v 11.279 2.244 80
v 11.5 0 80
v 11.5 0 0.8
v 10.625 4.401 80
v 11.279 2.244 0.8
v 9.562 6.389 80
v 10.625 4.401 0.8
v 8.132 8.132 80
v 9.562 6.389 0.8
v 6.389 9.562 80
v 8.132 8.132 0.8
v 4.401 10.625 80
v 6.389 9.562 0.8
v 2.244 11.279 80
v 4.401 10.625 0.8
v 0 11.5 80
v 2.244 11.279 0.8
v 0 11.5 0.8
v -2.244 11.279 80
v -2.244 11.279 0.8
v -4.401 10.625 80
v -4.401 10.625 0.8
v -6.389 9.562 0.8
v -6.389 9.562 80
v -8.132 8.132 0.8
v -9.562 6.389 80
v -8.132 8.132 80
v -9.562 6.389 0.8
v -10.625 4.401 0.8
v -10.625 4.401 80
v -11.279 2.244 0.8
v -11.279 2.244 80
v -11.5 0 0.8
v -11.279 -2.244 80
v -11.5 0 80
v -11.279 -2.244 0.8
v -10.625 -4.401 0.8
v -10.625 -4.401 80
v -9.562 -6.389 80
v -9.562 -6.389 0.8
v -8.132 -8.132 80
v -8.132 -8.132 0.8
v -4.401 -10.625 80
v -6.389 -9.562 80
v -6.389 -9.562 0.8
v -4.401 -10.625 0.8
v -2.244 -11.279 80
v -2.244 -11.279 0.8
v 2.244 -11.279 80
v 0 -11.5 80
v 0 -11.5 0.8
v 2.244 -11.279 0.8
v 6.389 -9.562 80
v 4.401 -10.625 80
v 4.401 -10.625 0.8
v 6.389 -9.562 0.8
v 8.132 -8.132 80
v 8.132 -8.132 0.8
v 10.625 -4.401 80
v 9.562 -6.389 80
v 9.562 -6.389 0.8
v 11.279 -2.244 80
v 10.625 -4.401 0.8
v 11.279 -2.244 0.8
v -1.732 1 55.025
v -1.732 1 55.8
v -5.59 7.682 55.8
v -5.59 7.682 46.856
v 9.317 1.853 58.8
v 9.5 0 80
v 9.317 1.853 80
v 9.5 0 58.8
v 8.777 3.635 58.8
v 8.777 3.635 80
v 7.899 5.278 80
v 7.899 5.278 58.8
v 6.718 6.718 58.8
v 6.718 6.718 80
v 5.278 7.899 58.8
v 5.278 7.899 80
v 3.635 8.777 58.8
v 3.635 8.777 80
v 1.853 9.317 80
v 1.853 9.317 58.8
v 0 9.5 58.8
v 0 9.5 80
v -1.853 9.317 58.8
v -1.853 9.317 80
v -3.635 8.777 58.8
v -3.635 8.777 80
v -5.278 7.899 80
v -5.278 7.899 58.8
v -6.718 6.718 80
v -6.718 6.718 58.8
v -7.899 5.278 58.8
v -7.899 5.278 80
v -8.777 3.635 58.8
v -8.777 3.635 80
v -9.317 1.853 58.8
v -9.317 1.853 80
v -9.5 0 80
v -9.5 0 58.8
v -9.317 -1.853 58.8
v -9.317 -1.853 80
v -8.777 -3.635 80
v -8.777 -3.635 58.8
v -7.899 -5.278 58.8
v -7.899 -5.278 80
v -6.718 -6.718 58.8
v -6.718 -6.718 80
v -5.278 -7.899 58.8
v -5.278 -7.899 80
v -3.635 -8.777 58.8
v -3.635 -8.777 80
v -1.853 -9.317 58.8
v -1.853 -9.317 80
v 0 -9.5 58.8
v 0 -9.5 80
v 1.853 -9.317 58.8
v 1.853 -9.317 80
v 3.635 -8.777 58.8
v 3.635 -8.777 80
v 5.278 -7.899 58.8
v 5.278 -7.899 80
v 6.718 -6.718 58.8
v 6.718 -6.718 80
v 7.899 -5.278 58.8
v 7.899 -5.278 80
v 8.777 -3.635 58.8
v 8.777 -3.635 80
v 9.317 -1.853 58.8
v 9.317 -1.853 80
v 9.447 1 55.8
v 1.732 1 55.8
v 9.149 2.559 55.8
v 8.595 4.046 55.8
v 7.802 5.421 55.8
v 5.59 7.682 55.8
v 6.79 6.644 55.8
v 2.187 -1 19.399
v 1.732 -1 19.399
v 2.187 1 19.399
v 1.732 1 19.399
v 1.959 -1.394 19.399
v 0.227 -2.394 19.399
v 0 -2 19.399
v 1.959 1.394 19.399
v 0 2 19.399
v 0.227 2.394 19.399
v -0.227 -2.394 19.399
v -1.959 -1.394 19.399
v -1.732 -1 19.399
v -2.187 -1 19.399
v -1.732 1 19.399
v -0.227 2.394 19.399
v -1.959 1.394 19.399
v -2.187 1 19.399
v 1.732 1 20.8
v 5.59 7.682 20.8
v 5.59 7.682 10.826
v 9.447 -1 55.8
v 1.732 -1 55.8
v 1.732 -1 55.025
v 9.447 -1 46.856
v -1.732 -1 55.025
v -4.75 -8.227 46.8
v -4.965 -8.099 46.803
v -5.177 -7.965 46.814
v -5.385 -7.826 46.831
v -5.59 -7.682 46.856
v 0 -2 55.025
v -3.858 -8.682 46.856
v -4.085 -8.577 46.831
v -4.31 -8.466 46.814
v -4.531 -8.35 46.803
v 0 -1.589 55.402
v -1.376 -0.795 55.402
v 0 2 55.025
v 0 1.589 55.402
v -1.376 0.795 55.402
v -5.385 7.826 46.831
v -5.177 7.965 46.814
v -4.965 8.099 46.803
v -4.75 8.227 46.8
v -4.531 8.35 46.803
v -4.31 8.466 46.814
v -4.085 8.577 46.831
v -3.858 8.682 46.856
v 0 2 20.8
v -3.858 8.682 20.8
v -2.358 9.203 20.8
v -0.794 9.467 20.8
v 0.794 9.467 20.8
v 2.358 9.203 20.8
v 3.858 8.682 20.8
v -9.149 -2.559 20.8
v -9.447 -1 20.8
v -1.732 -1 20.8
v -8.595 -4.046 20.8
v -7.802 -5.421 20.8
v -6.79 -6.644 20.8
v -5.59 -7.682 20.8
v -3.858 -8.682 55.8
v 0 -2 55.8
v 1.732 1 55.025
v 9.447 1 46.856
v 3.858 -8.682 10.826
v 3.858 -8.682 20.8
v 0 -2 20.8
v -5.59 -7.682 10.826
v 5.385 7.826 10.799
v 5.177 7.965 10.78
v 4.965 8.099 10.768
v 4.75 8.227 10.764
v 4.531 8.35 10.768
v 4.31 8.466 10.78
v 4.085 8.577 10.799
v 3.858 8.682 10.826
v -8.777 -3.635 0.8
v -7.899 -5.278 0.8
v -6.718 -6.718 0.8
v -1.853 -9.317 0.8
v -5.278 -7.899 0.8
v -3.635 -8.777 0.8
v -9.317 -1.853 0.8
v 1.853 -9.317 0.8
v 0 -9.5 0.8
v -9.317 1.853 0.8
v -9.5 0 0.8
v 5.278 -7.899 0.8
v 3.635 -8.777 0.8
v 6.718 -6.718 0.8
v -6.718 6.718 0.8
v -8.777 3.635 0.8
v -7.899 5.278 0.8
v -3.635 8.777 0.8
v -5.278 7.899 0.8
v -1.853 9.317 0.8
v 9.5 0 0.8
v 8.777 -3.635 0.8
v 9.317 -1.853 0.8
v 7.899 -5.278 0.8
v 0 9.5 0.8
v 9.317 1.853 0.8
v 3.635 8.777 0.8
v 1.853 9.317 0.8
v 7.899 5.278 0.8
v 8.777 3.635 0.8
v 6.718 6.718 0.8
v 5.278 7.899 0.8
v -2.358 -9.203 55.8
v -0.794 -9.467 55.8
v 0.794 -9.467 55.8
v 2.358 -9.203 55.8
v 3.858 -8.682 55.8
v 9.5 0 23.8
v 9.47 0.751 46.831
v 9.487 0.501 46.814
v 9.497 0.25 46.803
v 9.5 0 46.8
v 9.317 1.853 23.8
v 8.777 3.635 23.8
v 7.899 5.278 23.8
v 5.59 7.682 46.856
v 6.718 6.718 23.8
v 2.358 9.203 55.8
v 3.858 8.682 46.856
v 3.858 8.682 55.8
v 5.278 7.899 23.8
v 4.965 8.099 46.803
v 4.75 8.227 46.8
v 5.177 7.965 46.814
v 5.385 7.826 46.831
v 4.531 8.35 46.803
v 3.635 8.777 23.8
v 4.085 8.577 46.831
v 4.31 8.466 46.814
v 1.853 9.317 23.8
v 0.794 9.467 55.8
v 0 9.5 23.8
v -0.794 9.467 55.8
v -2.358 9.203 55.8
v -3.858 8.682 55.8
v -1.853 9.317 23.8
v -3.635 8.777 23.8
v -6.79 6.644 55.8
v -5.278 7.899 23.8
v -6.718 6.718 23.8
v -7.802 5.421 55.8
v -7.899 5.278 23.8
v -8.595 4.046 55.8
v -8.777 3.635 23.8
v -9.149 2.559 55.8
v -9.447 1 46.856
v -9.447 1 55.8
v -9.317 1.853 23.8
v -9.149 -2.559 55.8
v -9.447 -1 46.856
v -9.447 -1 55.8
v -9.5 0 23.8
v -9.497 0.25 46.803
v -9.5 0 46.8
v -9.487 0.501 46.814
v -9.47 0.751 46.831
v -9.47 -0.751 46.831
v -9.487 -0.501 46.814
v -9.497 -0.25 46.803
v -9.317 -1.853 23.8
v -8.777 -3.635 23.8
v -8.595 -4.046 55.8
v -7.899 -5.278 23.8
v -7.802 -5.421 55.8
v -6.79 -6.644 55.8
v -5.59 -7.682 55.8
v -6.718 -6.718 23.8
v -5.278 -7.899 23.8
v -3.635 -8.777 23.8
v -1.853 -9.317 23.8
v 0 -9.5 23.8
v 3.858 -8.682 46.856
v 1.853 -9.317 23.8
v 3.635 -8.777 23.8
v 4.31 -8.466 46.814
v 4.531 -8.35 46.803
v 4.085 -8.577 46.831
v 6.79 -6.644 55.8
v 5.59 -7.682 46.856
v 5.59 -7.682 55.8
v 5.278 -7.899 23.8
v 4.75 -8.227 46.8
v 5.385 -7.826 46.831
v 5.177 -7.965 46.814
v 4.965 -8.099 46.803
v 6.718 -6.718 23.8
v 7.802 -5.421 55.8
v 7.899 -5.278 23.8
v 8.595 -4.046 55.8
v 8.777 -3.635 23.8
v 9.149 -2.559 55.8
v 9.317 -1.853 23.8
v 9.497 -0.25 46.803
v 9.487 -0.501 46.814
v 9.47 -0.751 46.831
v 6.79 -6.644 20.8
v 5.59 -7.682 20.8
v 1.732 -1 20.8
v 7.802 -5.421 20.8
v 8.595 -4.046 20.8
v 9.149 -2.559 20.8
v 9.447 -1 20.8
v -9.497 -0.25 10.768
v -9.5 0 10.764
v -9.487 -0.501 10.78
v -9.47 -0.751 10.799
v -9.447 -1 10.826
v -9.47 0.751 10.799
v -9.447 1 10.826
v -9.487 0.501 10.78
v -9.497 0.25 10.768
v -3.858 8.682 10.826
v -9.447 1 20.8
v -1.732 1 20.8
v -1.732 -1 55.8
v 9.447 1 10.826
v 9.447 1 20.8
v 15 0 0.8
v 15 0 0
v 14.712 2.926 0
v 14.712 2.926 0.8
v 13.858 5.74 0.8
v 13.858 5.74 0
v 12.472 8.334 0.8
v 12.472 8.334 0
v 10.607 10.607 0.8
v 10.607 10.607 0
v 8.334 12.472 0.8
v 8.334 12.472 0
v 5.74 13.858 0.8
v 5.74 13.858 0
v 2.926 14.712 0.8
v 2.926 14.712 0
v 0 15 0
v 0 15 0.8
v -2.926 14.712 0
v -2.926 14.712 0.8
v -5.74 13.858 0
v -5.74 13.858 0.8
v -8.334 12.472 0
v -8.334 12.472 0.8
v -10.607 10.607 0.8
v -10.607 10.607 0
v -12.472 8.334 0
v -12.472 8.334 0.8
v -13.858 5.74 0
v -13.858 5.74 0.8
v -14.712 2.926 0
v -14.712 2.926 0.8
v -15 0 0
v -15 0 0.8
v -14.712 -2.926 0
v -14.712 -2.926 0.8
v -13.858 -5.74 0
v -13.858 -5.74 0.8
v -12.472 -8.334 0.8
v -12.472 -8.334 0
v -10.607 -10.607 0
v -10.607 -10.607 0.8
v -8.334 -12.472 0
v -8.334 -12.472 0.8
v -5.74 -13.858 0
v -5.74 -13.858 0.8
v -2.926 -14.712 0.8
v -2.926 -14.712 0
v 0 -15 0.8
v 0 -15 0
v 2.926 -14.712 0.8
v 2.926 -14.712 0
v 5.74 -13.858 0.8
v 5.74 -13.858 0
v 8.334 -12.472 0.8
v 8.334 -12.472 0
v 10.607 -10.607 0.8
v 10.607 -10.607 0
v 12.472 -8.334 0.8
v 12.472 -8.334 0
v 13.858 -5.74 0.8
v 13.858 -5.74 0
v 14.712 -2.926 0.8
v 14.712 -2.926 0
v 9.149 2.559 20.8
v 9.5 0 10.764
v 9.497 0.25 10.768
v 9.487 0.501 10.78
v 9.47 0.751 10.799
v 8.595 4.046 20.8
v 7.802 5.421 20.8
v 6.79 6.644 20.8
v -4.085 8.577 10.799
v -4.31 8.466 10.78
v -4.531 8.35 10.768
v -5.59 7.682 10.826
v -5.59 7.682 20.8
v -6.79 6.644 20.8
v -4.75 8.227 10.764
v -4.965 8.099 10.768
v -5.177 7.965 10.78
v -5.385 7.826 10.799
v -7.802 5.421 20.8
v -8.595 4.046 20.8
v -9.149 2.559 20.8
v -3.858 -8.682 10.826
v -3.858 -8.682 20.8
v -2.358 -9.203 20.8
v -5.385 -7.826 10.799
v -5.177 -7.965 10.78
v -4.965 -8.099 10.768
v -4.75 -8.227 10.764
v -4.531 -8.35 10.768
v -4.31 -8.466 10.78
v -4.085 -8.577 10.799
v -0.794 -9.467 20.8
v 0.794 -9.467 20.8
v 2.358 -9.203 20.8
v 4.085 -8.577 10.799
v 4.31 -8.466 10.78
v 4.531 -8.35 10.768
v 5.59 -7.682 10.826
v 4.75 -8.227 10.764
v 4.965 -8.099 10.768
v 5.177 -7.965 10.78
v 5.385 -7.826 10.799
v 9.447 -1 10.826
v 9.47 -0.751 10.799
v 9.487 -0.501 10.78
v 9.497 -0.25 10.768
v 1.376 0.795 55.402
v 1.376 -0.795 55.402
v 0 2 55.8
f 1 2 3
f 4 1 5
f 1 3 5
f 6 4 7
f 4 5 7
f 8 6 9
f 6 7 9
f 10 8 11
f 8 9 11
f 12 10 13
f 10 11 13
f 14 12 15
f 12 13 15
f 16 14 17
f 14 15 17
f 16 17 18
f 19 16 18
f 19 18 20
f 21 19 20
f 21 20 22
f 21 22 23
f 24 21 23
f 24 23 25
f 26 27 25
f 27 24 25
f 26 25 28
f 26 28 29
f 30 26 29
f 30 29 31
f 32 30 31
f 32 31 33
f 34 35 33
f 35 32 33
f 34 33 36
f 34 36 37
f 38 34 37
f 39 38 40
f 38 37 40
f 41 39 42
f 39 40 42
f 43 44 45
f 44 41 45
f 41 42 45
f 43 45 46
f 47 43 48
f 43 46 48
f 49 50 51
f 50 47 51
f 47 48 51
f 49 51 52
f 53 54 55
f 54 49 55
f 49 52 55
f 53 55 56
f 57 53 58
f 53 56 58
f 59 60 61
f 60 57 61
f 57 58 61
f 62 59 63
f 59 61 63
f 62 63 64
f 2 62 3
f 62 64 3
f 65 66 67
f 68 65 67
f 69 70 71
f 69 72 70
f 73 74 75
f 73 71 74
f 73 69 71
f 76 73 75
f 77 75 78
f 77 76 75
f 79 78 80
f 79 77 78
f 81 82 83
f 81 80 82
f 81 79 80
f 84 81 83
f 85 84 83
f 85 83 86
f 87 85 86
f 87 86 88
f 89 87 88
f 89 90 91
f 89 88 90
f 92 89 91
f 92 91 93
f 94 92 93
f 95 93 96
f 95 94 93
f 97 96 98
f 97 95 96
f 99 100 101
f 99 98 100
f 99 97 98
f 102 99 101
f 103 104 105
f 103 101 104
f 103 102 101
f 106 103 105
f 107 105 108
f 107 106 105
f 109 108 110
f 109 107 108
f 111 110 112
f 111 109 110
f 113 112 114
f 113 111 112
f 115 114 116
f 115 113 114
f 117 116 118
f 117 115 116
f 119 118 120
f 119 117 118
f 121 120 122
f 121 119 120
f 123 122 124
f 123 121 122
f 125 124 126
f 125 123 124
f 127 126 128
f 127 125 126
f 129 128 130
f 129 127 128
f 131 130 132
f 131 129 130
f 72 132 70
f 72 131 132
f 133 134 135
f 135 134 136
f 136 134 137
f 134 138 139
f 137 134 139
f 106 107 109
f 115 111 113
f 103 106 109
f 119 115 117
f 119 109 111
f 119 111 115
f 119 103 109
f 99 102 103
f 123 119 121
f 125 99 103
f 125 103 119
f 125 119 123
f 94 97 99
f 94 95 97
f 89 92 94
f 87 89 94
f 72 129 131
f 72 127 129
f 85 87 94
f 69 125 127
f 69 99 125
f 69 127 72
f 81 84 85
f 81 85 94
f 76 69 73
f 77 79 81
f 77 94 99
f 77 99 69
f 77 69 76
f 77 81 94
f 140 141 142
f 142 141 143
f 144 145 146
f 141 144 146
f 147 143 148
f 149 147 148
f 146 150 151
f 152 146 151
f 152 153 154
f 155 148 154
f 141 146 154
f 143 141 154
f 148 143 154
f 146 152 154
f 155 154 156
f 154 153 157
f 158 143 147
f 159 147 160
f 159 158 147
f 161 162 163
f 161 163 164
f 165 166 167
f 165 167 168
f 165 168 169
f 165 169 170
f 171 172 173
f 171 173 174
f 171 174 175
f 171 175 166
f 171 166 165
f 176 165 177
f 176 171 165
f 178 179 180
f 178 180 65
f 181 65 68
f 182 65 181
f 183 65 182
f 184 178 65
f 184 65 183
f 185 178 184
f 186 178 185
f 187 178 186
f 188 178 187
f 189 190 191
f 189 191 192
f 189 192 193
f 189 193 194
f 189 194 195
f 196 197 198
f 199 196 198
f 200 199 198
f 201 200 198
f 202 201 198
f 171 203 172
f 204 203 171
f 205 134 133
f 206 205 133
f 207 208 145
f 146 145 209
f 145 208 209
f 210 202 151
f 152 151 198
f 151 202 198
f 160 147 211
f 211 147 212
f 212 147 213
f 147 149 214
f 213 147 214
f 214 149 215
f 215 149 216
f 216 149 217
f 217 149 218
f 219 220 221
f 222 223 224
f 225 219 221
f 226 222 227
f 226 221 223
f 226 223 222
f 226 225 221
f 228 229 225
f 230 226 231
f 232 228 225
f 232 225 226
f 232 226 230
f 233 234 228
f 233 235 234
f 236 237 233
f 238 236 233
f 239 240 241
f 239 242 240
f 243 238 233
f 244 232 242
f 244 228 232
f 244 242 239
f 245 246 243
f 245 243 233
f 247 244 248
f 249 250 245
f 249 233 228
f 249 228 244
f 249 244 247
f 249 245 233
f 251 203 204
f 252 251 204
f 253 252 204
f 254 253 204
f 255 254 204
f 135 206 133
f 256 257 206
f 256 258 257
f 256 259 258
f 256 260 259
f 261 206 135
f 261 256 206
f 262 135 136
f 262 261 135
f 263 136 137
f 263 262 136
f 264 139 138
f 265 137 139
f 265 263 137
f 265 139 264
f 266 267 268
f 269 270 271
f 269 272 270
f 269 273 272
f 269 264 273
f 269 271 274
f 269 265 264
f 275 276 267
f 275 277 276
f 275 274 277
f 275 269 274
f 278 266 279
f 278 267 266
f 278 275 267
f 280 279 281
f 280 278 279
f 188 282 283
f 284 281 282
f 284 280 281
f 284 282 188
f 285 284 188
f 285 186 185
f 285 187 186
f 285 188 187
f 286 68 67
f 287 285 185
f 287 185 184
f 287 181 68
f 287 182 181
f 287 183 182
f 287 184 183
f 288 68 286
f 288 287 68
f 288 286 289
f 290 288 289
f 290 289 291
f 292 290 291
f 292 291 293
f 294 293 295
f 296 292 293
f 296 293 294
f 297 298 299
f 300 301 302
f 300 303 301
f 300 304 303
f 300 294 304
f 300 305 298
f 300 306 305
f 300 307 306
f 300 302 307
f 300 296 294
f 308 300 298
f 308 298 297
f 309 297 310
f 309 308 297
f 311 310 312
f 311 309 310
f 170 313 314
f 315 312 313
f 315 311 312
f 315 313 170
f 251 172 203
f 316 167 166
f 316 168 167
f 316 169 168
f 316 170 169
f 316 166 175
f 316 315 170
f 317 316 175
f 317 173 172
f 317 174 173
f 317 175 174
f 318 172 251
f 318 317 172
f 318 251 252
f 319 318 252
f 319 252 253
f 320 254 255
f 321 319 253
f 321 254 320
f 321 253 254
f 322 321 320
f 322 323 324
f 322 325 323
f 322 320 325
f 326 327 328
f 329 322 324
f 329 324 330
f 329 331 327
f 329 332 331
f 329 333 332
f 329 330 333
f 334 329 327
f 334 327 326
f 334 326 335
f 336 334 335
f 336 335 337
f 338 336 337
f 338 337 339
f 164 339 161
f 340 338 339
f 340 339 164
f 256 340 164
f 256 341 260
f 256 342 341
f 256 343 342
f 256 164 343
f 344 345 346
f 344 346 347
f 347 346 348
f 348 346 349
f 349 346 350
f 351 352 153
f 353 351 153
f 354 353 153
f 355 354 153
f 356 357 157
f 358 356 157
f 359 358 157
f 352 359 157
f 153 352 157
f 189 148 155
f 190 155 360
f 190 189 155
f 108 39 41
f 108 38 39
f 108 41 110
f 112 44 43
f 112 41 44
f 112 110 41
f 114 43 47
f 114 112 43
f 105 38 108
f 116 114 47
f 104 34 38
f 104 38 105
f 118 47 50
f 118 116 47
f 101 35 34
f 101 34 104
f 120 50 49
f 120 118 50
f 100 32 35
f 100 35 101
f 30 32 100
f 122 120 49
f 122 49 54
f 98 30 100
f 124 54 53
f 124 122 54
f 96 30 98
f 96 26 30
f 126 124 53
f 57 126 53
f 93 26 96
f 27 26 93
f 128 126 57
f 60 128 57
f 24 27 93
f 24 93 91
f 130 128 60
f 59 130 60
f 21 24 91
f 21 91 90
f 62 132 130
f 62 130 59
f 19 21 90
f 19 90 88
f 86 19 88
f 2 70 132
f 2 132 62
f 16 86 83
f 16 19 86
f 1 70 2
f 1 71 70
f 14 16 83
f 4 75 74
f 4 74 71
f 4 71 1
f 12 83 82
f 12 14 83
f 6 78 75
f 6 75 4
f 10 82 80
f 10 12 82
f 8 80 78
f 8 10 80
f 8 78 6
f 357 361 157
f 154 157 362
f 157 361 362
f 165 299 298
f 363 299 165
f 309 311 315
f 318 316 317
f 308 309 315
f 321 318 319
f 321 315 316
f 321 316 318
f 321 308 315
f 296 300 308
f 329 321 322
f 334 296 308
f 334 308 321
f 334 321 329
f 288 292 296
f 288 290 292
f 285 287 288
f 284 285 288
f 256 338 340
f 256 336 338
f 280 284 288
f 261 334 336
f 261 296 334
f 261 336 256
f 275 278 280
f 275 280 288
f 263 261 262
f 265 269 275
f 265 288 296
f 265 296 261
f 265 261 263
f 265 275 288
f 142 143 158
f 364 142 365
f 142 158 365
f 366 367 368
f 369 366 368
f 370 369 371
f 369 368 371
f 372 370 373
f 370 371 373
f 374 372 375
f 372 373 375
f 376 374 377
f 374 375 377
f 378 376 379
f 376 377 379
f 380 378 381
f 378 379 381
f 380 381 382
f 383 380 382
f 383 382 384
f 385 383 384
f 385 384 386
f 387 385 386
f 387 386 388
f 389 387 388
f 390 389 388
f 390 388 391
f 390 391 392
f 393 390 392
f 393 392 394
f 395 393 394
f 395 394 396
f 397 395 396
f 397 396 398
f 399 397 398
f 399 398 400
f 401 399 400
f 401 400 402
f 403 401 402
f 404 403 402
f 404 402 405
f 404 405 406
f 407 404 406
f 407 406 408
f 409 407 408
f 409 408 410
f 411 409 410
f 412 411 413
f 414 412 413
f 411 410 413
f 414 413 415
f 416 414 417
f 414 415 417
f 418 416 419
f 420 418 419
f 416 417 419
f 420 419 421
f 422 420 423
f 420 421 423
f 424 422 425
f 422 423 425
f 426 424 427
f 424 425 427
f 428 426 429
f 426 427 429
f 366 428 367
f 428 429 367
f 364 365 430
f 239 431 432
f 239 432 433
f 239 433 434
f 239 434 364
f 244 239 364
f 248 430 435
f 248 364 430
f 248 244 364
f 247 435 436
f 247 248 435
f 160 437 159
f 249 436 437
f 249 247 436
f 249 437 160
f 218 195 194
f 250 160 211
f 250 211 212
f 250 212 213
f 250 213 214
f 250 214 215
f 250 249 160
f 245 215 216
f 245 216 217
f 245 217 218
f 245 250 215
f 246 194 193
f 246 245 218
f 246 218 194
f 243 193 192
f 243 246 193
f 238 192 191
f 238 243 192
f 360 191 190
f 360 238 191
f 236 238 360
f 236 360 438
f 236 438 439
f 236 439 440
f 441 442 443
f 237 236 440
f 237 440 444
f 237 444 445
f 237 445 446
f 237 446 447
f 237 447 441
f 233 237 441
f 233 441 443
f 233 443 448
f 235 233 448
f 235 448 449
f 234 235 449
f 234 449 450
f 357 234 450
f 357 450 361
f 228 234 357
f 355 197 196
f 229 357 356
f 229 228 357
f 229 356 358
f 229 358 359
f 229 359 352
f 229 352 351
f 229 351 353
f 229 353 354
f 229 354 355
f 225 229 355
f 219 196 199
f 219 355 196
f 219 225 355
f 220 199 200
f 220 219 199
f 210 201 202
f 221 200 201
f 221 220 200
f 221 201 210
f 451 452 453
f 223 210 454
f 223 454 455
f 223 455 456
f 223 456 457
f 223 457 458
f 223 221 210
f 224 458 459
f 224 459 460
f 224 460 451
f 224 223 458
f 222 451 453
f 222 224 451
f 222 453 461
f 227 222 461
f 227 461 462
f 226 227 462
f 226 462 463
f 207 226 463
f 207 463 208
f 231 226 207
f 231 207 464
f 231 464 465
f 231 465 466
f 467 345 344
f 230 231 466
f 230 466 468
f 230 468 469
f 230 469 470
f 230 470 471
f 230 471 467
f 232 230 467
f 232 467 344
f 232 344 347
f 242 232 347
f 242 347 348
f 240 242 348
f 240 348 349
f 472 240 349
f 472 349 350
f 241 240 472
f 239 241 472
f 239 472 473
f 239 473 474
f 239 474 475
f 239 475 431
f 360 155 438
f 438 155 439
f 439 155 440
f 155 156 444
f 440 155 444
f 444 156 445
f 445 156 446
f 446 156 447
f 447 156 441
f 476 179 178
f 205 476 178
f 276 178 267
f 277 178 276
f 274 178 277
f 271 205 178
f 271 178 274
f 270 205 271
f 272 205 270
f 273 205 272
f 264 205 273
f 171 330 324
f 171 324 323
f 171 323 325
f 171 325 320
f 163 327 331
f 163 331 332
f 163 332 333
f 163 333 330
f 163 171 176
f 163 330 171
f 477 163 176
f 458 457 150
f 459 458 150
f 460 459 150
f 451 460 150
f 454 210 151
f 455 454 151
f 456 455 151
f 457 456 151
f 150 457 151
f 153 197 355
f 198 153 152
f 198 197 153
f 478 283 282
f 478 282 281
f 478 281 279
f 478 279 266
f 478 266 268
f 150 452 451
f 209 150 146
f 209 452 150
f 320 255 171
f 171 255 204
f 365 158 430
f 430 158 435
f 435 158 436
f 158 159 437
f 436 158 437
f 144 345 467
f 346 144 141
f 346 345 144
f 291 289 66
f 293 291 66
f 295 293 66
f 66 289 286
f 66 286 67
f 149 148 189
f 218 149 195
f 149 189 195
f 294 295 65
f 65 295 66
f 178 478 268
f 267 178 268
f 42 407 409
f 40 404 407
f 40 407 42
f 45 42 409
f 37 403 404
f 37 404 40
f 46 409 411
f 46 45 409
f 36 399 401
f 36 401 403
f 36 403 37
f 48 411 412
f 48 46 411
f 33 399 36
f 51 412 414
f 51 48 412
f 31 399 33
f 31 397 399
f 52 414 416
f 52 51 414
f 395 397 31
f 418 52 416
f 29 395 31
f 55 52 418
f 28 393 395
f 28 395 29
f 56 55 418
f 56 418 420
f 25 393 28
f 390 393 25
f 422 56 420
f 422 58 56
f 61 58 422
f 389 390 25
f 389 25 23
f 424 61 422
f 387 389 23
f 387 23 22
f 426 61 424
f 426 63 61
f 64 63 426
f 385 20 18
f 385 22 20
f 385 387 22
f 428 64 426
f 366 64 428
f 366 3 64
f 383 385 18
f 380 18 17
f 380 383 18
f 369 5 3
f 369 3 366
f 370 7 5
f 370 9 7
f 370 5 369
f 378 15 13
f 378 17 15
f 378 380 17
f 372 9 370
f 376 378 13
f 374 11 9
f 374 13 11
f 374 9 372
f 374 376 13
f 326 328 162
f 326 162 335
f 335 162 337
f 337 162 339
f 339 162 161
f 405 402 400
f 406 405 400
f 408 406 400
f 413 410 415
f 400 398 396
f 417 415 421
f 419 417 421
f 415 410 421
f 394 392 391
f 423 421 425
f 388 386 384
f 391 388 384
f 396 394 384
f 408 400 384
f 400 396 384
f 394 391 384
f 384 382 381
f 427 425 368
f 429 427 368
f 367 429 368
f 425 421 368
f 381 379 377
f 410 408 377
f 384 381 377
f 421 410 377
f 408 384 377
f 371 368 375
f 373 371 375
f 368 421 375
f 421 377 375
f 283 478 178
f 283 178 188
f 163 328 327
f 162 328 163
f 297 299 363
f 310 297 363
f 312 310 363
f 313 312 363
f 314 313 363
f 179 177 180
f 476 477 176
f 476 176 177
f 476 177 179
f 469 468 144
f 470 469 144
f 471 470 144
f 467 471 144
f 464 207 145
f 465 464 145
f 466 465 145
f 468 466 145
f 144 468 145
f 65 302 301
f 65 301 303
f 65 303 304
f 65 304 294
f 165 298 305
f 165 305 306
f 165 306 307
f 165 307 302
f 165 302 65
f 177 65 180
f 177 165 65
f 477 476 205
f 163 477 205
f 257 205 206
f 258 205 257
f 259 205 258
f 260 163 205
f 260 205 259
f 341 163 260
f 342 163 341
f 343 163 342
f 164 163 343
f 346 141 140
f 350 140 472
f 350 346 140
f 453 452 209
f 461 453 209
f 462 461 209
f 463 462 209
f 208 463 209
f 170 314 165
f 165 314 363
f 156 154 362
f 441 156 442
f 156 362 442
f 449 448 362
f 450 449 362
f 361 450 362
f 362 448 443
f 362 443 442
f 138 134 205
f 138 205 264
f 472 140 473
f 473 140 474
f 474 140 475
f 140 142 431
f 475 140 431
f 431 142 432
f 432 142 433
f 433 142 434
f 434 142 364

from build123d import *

# Parameters (mm, degrees)
F0_R      = 15
F0_R_2    = 11.5
F1_DEPTH  = 0.8
F0_R_3    = 9.5
F2_DEPTH  = 80
F4_R      = 9.5
F5_DEPTH  = 3
F7_R      = 9.5
F8_DEPTH  = 3
F10_DEPTH = 1
F11_COUNT = 3
F11_ANGLE = 120


with BuildPart() as f1:
    # F0 (on Top) → F1 (new body)
    with BuildSketch(Plane.XY):
        Circle(F0_R)
        Circle(F0_R_2, mode=Mode.SUBTRACT)
    extrude(amount=F1_DEPTH)



with BuildPart() as f1b:
    # F0 (on Top) → F1, piece 2 (new body)
    with BuildSketch(Plane.XY):
        Circle(F0_R_3)
    extrude(amount=F1_DEPTH)


with BuildPart() as f1_1:
    add(f1.part)

    add(f1b.part)  # F2 merges F1b
    # F0 (on Top) → F2 (join)
    with BuildSketch(Plane.XY):
        Circle(F0_R_2)
        Circle(F0_R_3, mode=Mode.SUBTRACT)
    extrude(amount=F2_DEPTH)

    # F4 (on offset) → F5 (join)
    with BuildSketch(Plane.XY.offset(20.8)):
        Circle(F4_R)
    extrude(amount=F5_DEPTH)

    # F7 (on offset) → F8 (join)
    with BuildSketch(Plane.XY.offset(58.8)):
        Circle(F7_R)
    extrude(amount=-F8_DEPTH)

    # F9 (on Front) → F10 (join, symmetric)
    with BuildSketch(Plane.XZ):
        Polygon((-1, 20.8), (-9.5, 20.8), (-9.5, 10.7640403081), (-2.1869234638, 19.3985981129), align=None)
        Polygon((0, 20.8), (-1, 20.8), (-2.1869234638, 19.3985981129), (0, 19.3985981129), (2.1869234638, 19.3985981129), (1, 20.8), align=None)
        Polygon((9.5, 20.8), (1, 20.8), (2.1869234638, 19.3985981129), (9.5, 10.7640403081), align=None)
        Polygon((-1.3762295453, 55.4016393049), (-1, 55.8), (-9.5, 55.8), (-9.5, 46.8), align=None)
        Polygon((0, 55.8), (-1, 55.8), (-1.3762295453, 55.4016393049), (0, 55.4016393049), (1.3762295453, 55.4016393049), (1, 55.8), align=None)
        Polygon((9.5, 55.8), (1, 55.8), (1.3762295453, 55.4016393049), (9.5, 46.8), align=None)
    extrude(amount=F10_DEPTH, both=True)

    # F11: F1 ×3 about axis
    f11_axis = Axis((0, 0, 50), (0, 0, 1))


with BuildPart() as f1_2:
    add(f1_1.part)
    for i in range(1, F11_COUNT):
        add(f1_1.part.rotate(f11_axis, i * F11_ANGLE / (F11_COUNT - 1)))


solid = f1_2.part
